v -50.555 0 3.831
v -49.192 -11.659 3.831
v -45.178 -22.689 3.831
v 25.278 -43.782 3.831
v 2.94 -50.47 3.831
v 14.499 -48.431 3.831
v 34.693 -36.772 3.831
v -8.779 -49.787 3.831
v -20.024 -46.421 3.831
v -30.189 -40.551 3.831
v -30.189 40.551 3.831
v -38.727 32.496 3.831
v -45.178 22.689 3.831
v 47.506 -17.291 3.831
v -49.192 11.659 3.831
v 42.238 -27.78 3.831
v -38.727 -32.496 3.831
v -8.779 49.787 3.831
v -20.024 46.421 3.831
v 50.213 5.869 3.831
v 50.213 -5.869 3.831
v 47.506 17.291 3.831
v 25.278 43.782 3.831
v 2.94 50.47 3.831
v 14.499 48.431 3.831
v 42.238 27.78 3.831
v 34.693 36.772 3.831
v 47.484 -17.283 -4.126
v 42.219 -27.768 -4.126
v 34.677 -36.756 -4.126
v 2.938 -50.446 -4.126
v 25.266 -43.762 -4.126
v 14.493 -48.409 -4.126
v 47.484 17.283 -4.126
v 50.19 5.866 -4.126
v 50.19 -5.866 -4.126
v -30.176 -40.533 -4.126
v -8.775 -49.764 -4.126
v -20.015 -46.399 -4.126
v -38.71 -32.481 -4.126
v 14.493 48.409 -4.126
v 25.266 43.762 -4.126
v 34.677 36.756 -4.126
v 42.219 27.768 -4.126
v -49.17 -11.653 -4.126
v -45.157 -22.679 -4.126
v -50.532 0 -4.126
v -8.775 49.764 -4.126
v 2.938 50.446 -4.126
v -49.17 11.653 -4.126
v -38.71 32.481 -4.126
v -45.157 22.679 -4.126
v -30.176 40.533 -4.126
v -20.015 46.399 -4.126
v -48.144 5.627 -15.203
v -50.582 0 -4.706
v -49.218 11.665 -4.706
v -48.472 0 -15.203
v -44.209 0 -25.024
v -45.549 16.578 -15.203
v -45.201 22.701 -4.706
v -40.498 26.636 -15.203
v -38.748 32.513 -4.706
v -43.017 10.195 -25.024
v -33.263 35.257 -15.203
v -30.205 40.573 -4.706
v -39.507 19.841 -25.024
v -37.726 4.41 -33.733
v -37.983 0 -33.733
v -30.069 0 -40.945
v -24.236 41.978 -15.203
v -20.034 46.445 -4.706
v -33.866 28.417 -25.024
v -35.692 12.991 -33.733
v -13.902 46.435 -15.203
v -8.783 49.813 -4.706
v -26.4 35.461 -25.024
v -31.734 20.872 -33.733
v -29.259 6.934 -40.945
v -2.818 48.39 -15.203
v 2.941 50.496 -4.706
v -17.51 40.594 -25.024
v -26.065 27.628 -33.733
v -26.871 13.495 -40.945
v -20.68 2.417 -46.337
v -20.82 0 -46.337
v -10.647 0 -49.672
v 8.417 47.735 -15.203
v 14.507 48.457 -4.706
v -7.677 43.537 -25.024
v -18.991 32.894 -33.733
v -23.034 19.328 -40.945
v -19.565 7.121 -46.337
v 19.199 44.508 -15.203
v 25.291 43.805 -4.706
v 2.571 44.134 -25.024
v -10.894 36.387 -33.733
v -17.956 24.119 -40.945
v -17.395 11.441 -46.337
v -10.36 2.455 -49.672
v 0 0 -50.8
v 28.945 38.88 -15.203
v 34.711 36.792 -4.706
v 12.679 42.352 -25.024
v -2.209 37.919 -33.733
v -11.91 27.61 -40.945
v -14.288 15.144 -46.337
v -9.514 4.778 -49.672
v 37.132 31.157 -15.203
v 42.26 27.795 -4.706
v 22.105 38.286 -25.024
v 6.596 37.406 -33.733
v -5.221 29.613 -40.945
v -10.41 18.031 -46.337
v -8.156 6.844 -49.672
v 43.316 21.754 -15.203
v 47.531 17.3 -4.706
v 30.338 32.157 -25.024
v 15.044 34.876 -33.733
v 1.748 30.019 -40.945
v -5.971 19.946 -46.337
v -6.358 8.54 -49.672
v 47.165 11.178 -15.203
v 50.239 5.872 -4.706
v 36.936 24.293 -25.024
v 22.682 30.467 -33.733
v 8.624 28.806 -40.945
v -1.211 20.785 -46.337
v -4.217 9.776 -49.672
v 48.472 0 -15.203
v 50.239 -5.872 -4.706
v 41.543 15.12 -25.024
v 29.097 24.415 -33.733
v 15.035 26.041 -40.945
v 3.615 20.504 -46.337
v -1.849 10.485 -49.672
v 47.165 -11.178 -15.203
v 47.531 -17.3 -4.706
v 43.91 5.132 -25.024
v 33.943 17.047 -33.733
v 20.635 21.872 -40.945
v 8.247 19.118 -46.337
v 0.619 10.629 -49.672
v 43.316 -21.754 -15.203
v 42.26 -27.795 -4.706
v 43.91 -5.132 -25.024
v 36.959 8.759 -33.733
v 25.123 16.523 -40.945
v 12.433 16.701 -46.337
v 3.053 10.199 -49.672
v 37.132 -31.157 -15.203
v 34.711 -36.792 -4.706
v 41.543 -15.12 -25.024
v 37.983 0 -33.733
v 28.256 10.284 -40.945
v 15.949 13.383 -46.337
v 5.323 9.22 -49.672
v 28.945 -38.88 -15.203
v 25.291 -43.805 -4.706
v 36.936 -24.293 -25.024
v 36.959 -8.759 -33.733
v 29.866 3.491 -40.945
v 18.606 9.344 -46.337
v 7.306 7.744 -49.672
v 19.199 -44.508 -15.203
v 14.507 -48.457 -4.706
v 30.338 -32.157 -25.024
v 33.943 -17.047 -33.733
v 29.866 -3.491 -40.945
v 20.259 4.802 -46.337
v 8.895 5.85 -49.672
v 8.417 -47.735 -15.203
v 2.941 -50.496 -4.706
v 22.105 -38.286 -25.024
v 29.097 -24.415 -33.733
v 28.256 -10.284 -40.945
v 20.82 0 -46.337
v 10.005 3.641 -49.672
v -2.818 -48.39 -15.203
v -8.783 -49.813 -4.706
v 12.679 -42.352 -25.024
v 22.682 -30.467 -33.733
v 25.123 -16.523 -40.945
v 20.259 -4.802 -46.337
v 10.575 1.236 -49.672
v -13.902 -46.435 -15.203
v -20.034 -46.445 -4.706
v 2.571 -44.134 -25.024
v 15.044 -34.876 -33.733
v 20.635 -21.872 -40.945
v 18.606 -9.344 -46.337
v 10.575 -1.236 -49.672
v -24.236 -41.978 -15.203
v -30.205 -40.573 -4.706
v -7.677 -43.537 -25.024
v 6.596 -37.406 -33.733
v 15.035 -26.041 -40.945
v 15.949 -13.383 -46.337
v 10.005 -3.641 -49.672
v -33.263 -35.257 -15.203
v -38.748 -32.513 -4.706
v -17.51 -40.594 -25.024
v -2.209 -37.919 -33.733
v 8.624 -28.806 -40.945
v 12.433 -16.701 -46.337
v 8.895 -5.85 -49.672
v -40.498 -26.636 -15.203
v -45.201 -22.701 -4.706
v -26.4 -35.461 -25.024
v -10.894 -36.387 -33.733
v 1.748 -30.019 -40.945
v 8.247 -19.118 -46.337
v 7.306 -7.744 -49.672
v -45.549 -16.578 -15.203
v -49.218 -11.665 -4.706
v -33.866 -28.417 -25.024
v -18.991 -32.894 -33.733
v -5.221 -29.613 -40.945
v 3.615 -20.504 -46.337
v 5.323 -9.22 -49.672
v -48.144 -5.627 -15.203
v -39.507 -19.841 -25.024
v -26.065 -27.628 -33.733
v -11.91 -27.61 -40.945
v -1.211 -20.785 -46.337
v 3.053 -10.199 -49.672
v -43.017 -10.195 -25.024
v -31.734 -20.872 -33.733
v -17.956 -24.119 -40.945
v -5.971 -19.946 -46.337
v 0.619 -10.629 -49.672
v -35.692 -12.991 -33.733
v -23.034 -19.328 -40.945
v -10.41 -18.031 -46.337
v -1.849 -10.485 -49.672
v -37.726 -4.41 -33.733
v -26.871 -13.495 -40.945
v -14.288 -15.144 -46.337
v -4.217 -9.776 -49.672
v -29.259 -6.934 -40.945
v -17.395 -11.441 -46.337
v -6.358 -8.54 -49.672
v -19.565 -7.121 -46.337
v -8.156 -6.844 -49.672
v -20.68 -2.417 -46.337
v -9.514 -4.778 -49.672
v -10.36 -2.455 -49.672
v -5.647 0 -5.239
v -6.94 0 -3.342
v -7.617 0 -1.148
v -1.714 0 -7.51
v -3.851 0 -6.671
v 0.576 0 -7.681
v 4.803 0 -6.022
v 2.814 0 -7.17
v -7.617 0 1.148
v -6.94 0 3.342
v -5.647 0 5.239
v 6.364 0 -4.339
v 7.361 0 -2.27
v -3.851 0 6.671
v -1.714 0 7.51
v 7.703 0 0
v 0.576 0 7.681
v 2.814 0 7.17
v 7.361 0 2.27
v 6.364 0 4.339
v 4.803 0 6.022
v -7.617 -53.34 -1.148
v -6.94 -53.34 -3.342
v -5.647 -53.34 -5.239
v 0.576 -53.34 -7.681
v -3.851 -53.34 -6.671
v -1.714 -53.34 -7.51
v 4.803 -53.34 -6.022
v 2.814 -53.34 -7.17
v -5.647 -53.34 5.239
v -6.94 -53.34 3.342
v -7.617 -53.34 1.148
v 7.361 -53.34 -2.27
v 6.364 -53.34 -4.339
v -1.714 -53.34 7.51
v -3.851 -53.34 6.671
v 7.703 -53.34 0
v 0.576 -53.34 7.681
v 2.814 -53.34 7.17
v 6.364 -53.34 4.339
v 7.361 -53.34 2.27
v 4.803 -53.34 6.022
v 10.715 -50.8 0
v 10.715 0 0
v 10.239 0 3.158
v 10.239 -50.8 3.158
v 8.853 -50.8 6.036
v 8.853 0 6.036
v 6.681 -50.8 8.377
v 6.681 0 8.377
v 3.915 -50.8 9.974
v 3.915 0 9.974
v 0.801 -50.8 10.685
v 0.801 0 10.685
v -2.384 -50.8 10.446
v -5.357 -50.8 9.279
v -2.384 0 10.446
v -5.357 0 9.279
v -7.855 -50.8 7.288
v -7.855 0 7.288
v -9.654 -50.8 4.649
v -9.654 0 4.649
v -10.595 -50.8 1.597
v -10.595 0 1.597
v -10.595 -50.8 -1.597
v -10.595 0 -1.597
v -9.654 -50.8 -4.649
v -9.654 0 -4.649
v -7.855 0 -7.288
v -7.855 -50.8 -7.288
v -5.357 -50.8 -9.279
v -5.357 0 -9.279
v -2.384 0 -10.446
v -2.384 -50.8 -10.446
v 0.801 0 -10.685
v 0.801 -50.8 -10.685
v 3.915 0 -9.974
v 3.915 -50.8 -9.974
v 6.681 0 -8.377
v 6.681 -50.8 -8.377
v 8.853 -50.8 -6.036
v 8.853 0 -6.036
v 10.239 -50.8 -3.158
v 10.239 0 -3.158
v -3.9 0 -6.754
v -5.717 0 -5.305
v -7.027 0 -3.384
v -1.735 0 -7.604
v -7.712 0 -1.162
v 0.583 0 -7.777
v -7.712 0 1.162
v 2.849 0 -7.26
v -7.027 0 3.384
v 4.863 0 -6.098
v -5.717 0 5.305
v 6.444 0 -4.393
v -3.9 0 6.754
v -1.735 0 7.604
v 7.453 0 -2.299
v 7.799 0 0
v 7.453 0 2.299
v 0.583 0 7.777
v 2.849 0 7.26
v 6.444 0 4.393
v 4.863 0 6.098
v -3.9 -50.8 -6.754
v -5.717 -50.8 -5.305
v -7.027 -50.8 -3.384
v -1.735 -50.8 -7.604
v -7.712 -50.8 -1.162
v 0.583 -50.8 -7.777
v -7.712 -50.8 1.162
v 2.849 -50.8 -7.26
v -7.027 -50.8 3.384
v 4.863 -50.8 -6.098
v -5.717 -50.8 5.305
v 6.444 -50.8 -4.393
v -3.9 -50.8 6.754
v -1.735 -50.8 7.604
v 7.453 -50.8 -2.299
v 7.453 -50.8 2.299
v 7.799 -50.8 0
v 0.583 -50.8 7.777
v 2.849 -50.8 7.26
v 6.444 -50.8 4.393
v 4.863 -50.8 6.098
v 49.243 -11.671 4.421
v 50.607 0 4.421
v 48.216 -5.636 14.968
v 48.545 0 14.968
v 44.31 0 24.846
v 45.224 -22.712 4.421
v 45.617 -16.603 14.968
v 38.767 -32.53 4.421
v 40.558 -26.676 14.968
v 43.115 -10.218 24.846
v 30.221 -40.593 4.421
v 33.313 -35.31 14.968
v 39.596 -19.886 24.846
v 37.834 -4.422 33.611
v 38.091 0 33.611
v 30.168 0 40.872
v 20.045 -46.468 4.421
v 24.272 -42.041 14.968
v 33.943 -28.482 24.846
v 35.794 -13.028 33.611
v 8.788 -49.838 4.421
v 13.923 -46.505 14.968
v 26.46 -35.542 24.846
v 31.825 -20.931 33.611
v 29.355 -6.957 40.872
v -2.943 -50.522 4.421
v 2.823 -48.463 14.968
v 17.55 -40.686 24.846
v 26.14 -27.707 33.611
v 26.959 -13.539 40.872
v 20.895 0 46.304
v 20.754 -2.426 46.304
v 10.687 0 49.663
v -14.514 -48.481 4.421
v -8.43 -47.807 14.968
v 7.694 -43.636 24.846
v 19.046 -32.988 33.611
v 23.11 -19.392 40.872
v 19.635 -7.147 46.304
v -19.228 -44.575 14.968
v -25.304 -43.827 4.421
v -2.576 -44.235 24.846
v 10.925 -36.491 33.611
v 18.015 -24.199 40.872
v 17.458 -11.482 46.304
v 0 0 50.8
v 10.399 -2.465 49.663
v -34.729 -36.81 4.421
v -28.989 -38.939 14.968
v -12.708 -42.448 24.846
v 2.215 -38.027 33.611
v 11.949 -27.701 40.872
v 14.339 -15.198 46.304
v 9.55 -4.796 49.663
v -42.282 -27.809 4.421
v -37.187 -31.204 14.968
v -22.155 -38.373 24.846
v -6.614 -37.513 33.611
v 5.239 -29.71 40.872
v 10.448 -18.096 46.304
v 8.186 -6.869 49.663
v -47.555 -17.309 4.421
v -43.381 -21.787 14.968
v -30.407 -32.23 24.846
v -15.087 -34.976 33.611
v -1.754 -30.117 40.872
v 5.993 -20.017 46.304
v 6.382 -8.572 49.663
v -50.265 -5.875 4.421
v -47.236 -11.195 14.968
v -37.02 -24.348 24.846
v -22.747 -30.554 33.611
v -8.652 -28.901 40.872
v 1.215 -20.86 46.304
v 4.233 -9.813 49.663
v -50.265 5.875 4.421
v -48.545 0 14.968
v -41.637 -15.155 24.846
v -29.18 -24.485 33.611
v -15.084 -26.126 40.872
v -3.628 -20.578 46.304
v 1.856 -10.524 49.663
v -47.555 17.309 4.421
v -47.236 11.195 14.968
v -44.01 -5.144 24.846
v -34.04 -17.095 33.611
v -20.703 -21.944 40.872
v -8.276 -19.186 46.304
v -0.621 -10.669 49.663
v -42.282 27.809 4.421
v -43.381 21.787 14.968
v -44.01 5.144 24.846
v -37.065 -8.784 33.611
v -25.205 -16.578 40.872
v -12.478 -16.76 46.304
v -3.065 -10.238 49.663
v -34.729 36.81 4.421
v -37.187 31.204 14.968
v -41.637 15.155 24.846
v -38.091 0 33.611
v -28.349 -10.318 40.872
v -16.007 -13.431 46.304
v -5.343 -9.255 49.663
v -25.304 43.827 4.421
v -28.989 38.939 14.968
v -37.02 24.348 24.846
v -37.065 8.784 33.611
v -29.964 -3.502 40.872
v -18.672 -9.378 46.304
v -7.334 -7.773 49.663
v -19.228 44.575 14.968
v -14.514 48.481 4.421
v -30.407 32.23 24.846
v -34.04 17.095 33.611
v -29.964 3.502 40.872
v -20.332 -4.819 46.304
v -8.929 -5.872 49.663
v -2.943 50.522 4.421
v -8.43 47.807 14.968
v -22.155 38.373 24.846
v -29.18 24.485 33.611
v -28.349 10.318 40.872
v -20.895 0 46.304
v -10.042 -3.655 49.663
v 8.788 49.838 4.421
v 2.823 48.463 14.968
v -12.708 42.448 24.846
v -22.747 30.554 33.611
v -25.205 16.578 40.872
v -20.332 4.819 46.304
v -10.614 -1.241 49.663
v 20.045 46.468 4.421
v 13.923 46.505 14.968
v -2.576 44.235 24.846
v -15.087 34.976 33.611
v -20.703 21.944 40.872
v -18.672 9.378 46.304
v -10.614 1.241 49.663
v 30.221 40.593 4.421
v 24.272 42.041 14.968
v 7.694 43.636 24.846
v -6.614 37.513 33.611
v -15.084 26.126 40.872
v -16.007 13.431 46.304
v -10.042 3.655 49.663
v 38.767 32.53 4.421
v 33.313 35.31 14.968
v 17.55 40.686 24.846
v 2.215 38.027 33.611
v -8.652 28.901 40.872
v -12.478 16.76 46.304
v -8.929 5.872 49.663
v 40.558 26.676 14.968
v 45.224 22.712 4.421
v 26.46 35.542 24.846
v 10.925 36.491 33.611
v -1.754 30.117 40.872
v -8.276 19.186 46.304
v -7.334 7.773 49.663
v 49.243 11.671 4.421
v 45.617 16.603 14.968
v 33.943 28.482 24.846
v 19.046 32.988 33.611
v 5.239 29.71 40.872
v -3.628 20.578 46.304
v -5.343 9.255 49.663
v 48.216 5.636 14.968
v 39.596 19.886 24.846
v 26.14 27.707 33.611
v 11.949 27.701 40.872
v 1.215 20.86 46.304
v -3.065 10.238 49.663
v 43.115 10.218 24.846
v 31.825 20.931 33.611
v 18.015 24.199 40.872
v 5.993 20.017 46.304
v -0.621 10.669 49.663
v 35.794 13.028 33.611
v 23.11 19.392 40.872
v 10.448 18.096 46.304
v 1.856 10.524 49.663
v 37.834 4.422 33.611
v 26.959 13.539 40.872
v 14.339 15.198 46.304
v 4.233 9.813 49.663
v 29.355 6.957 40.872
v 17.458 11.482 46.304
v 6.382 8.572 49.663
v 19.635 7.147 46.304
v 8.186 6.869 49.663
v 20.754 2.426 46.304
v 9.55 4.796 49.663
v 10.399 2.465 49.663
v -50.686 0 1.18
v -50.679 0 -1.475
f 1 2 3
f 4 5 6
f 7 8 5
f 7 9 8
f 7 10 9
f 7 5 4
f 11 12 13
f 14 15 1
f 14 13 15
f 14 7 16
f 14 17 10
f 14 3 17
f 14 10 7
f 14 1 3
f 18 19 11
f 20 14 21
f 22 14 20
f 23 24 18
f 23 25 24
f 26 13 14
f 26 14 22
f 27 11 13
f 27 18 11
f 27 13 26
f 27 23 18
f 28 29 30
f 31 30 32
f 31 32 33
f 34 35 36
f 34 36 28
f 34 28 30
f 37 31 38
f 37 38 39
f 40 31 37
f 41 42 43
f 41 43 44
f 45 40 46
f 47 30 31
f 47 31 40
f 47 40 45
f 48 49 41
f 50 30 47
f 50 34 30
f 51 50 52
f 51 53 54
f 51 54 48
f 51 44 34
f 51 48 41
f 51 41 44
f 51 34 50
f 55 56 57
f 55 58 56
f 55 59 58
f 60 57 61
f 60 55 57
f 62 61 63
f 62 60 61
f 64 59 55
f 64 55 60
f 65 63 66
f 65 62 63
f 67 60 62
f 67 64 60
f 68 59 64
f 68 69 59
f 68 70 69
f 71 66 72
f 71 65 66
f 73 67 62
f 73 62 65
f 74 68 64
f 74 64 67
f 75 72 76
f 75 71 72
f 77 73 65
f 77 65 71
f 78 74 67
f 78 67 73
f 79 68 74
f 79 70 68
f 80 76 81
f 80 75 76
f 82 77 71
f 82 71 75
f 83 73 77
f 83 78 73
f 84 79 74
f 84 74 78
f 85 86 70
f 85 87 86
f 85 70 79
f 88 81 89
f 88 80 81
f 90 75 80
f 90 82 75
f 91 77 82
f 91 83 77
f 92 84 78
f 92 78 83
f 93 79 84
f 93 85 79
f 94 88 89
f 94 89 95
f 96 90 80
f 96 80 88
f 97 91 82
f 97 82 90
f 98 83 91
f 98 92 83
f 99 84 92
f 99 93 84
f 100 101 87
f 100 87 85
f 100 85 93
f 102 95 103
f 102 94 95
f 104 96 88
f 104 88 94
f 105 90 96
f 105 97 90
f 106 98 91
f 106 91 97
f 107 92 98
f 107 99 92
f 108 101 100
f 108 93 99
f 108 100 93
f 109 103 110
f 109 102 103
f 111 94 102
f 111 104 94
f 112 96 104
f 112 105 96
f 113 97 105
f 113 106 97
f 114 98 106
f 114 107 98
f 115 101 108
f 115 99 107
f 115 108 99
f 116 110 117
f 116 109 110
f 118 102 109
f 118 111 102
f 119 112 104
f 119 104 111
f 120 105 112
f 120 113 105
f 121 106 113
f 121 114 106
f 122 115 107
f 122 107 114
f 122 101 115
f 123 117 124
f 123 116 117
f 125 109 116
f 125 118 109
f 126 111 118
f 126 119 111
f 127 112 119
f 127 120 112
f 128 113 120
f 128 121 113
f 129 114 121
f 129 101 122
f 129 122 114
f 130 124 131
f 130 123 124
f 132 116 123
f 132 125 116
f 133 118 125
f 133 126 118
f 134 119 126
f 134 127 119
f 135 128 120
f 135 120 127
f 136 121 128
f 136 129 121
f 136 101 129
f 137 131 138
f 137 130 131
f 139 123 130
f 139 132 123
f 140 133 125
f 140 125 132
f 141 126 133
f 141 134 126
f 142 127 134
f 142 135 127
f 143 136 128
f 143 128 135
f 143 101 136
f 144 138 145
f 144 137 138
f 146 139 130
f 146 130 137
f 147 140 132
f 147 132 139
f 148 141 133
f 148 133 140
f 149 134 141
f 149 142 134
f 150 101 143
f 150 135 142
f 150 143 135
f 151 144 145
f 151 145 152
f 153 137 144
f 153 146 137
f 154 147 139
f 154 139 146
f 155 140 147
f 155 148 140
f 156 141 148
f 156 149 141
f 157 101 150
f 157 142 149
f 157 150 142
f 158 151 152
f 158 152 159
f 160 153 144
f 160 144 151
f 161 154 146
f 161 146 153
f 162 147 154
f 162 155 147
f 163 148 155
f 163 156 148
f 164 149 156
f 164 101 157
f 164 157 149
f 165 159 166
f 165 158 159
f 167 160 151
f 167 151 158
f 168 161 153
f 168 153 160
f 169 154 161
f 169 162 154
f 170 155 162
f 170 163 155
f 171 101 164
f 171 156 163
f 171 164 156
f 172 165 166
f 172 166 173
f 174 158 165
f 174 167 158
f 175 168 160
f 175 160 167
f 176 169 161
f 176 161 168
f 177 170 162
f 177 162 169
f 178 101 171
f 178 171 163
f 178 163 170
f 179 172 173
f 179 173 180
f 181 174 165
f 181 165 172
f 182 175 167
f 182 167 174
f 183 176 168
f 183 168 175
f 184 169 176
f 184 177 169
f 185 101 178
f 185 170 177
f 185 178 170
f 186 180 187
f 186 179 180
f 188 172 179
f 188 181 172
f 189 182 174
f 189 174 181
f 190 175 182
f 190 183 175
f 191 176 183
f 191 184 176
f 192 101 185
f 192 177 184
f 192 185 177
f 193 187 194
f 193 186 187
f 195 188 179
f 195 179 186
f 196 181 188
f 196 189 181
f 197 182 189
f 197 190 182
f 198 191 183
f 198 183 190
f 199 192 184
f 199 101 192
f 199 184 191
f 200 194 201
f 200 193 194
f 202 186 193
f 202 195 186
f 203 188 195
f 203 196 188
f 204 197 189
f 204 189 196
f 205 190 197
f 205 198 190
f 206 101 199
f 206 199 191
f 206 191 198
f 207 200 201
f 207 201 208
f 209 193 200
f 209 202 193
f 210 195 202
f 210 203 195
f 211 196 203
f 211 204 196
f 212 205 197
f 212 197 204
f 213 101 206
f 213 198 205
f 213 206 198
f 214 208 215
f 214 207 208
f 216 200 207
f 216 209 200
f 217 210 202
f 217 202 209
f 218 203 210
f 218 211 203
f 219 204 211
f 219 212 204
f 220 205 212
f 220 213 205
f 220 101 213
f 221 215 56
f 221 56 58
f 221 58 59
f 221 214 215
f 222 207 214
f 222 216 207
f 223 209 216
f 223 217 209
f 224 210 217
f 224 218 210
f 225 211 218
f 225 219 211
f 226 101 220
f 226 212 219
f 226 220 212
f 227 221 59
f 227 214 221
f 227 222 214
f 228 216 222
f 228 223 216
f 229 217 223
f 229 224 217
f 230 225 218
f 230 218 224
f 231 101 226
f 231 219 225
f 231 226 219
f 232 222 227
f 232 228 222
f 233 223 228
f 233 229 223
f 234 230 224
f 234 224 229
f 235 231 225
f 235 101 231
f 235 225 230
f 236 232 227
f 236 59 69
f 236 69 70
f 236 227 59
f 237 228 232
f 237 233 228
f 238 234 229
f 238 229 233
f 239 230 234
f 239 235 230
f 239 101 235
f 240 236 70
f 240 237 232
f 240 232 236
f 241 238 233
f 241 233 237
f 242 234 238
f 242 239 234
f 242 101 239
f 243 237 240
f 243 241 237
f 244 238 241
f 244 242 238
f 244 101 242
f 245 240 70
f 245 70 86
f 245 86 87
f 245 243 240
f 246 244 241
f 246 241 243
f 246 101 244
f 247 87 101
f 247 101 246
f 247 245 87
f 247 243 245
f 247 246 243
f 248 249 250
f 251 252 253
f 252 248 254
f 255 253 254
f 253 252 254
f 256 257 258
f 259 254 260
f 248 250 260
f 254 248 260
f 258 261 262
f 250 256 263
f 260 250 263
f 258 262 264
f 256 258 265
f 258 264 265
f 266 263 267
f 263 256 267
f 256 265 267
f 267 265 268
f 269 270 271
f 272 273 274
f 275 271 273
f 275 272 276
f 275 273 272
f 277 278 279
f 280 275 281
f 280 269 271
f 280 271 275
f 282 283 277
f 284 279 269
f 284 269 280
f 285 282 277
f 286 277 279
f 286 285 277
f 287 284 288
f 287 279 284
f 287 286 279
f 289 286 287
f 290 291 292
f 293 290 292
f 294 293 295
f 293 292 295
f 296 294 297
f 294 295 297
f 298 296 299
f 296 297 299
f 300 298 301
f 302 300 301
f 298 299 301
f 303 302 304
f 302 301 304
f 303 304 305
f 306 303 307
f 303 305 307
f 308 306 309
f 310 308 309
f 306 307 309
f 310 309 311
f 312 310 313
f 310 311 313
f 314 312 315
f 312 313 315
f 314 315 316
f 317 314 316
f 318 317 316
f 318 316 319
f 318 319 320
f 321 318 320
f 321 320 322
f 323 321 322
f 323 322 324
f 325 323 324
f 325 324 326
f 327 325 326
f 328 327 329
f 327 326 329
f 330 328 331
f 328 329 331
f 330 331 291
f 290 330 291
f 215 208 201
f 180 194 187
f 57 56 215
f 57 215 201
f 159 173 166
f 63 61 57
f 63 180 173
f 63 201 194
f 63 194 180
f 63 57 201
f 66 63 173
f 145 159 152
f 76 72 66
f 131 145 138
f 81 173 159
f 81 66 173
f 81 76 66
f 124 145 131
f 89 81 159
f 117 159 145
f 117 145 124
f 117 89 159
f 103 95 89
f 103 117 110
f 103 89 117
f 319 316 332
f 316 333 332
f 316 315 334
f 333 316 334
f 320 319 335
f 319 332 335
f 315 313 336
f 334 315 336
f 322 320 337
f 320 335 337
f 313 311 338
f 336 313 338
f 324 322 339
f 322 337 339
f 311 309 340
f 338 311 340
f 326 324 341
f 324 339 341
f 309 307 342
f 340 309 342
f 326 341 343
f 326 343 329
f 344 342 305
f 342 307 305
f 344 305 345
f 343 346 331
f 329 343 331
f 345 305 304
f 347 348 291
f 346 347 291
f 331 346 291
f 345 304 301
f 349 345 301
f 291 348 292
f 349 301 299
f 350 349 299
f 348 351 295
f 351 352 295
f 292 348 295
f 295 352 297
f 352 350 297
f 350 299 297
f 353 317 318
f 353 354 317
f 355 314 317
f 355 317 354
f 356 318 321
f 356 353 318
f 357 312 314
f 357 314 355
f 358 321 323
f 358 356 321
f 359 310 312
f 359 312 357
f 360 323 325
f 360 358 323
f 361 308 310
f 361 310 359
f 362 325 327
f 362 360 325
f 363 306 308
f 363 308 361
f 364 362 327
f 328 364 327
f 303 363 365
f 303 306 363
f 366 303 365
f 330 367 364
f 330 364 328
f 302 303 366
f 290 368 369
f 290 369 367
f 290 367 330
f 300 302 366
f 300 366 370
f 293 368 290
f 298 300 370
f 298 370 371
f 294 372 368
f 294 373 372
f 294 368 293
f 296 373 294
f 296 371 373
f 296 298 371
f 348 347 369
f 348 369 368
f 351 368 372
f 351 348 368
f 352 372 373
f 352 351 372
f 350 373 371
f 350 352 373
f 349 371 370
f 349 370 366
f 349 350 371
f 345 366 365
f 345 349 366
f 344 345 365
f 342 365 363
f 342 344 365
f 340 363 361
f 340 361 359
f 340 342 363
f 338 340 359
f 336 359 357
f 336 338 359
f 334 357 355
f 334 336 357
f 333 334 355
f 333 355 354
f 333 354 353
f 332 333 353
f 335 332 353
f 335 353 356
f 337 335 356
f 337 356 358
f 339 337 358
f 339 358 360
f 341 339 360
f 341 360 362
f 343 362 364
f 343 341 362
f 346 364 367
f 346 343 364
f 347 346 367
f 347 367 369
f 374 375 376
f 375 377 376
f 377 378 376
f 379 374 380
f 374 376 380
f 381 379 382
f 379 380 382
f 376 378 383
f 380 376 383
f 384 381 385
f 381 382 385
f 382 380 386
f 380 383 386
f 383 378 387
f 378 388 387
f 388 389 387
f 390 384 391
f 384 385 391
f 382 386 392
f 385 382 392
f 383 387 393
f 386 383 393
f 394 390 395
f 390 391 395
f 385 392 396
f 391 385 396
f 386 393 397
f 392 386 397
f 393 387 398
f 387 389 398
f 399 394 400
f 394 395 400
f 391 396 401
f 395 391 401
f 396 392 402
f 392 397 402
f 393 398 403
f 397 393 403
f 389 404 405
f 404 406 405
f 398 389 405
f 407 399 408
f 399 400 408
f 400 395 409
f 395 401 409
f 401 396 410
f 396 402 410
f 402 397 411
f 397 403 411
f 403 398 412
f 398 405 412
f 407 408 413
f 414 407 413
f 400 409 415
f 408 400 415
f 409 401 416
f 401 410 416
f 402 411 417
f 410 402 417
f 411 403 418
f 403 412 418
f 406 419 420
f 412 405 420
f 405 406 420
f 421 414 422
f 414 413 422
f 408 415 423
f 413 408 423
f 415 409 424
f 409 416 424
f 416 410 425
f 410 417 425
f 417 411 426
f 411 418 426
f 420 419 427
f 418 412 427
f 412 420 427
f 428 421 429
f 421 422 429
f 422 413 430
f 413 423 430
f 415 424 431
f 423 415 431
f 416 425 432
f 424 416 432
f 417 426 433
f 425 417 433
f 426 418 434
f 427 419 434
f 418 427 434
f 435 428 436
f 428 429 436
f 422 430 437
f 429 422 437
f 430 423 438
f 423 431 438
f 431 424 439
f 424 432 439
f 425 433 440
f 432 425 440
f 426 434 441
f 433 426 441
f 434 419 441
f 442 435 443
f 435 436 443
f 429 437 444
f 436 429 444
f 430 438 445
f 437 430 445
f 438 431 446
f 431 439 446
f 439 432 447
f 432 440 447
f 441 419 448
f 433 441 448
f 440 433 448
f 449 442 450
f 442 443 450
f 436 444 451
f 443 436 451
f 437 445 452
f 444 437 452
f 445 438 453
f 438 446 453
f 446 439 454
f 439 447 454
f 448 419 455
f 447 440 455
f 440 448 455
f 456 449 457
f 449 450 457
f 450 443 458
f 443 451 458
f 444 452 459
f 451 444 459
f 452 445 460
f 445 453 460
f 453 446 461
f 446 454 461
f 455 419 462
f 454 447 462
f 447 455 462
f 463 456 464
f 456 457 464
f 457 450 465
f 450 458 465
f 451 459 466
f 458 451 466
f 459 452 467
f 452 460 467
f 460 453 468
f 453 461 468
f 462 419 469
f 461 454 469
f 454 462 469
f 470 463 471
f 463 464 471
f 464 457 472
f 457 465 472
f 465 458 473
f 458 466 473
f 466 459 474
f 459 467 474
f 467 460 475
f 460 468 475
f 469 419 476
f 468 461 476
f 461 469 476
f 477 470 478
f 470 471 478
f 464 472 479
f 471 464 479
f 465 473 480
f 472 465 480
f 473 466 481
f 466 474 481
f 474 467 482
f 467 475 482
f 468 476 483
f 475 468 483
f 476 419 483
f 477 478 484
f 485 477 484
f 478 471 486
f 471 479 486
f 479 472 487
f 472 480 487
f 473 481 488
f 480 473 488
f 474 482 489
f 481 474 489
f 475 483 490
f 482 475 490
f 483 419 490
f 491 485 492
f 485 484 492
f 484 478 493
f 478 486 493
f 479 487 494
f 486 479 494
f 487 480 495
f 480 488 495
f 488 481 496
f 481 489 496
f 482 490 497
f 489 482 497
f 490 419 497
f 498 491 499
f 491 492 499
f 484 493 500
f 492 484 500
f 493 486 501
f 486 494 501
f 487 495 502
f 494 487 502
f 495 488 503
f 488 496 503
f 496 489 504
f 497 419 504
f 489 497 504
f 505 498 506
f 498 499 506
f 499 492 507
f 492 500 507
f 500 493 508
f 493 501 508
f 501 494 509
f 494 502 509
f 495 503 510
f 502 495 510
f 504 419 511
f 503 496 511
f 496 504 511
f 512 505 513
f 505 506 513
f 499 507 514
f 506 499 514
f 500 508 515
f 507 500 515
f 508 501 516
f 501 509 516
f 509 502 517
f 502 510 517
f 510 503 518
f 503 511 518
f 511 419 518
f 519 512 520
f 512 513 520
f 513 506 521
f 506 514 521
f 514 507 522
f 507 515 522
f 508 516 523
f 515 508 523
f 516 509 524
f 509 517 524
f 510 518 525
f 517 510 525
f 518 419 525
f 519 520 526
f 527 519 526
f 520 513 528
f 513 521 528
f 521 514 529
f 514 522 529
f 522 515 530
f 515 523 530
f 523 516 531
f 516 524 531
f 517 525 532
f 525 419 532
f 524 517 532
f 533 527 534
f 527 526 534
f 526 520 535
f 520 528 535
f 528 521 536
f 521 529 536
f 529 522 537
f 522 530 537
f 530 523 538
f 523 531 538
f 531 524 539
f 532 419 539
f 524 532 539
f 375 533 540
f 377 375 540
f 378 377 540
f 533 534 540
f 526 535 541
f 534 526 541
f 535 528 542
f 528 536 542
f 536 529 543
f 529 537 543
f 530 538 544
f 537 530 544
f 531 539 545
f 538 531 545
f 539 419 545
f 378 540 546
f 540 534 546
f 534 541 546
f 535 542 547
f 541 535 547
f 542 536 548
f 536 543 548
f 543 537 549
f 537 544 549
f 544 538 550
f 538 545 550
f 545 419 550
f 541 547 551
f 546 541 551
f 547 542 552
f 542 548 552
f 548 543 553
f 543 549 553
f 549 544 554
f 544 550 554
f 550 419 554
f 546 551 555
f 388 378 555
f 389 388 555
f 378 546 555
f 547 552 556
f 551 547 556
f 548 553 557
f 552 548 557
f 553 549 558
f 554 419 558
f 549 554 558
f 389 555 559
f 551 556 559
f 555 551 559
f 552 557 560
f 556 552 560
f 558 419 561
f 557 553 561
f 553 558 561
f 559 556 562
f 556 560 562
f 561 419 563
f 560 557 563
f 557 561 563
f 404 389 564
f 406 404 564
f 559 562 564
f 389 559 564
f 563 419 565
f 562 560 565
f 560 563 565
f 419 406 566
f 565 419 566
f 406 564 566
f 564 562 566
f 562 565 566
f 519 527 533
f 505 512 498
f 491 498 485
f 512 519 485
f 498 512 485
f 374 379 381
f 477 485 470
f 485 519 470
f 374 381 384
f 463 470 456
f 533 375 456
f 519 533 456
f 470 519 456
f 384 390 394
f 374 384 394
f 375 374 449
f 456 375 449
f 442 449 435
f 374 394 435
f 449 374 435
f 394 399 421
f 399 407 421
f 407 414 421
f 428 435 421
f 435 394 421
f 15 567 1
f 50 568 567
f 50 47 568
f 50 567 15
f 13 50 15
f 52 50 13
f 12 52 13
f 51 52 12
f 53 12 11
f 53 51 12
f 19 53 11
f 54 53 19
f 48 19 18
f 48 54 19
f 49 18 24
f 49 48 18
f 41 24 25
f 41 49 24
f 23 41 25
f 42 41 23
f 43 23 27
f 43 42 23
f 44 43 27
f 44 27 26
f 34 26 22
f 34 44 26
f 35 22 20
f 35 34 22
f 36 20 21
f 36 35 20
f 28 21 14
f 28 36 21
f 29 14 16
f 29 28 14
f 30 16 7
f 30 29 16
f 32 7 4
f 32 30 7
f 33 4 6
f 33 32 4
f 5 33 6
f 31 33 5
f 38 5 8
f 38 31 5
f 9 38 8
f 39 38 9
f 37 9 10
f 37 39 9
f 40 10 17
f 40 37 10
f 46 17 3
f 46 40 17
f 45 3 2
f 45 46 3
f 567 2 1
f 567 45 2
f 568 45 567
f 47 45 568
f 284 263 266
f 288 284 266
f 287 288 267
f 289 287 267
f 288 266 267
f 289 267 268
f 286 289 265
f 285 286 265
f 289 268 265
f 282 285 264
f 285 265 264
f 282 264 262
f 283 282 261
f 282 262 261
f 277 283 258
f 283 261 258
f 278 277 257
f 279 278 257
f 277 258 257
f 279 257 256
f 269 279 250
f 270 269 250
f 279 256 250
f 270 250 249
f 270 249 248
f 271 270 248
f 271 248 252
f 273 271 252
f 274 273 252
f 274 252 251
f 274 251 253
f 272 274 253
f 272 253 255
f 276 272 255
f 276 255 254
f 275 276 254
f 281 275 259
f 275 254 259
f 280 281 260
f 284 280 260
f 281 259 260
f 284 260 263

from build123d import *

# Parameters (mm, degrees)
F4_R     = 10.7149100796
F4_R_2   = 7.7990836669
F5_DEPTH = 50.8
F6_R     = 7.7028179703
F7_DEPTH = 53.34


with BuildPart() as f1:
    # F0 (on Front) → F1 (revolve)
    with BuildSketch(Plane.XZ):
        with BuildLine():
            Line((0, 4.4212299399), (50.6072398558, 4.4212299399))
            ThreePointArc((50.6072398558, 4.4212299399), (34.3223070251, 37.4515585854), (0, 50.8))
            Line((0, 50.8), (0, 4.4212299399))
        make_face()
    revolve(axis=Axis((0, 0, -3.1376481056), (0, 0, -1)))


with BuildPart() as f1b:
    # F0 (on Front) → F1, piece 2 (revolve)
    with BuildSketch(Plane.XZ):
        with BuildLine():
            ThreePointArc((-50.5815097067, -4.7064716928), (-34.216598589, -37.5481608204), (0, -50.8))
            Line((0, -50.8), (0, -4.7064716928))
            Line((0, -4.7064716928), (-50.5815097067, -4.7064716928))
        make_face()
    revolve(axis=Axis((0, 0, -3.1376481056), (0, 0, -1)))


with BuildPart() as f3:
    # F2 (on Front) → F3 (revolve)
    with BuildSketch(Plane.XZ):
        with BuildLine():
            Line((0, 3.8311993703), (-50.5551127039, 3.8311993703))
            ThreePointArc((-50.5551127039, 3.8311993703), (-50.6998581453, -0.1479633753), (-50.5318896475, -4.126213491))
            Line((-50.5318896475, -4.126213491), (0, -4.126213491))
            Line((0, -4.126213491), (0, 3.8311993703))
        make_face()
    revolve(axis=Axis((0, 0, -3.137646243), (0, 0, -1)))


with BuildPart() as f5:
    # F4 (on Front) → F5 (new body)
    with BuildSketch(Plane.XZ):
        Circle(F4_R)
        Circle(F4_R_2, mode=Mode.SUBTRACT)
    extrude(amount=F5_DEPTH)


with BuildPart() as f7:
    # F6 (on Front) → F7 (new body)
    with BuildSketch(Plane.XZ):
        Circle(F6_R)
    extrude(amount=F7_DEPTH)


solid = Compound([f1.part, f1b.part, f3.part, f5.part, f7.part])
